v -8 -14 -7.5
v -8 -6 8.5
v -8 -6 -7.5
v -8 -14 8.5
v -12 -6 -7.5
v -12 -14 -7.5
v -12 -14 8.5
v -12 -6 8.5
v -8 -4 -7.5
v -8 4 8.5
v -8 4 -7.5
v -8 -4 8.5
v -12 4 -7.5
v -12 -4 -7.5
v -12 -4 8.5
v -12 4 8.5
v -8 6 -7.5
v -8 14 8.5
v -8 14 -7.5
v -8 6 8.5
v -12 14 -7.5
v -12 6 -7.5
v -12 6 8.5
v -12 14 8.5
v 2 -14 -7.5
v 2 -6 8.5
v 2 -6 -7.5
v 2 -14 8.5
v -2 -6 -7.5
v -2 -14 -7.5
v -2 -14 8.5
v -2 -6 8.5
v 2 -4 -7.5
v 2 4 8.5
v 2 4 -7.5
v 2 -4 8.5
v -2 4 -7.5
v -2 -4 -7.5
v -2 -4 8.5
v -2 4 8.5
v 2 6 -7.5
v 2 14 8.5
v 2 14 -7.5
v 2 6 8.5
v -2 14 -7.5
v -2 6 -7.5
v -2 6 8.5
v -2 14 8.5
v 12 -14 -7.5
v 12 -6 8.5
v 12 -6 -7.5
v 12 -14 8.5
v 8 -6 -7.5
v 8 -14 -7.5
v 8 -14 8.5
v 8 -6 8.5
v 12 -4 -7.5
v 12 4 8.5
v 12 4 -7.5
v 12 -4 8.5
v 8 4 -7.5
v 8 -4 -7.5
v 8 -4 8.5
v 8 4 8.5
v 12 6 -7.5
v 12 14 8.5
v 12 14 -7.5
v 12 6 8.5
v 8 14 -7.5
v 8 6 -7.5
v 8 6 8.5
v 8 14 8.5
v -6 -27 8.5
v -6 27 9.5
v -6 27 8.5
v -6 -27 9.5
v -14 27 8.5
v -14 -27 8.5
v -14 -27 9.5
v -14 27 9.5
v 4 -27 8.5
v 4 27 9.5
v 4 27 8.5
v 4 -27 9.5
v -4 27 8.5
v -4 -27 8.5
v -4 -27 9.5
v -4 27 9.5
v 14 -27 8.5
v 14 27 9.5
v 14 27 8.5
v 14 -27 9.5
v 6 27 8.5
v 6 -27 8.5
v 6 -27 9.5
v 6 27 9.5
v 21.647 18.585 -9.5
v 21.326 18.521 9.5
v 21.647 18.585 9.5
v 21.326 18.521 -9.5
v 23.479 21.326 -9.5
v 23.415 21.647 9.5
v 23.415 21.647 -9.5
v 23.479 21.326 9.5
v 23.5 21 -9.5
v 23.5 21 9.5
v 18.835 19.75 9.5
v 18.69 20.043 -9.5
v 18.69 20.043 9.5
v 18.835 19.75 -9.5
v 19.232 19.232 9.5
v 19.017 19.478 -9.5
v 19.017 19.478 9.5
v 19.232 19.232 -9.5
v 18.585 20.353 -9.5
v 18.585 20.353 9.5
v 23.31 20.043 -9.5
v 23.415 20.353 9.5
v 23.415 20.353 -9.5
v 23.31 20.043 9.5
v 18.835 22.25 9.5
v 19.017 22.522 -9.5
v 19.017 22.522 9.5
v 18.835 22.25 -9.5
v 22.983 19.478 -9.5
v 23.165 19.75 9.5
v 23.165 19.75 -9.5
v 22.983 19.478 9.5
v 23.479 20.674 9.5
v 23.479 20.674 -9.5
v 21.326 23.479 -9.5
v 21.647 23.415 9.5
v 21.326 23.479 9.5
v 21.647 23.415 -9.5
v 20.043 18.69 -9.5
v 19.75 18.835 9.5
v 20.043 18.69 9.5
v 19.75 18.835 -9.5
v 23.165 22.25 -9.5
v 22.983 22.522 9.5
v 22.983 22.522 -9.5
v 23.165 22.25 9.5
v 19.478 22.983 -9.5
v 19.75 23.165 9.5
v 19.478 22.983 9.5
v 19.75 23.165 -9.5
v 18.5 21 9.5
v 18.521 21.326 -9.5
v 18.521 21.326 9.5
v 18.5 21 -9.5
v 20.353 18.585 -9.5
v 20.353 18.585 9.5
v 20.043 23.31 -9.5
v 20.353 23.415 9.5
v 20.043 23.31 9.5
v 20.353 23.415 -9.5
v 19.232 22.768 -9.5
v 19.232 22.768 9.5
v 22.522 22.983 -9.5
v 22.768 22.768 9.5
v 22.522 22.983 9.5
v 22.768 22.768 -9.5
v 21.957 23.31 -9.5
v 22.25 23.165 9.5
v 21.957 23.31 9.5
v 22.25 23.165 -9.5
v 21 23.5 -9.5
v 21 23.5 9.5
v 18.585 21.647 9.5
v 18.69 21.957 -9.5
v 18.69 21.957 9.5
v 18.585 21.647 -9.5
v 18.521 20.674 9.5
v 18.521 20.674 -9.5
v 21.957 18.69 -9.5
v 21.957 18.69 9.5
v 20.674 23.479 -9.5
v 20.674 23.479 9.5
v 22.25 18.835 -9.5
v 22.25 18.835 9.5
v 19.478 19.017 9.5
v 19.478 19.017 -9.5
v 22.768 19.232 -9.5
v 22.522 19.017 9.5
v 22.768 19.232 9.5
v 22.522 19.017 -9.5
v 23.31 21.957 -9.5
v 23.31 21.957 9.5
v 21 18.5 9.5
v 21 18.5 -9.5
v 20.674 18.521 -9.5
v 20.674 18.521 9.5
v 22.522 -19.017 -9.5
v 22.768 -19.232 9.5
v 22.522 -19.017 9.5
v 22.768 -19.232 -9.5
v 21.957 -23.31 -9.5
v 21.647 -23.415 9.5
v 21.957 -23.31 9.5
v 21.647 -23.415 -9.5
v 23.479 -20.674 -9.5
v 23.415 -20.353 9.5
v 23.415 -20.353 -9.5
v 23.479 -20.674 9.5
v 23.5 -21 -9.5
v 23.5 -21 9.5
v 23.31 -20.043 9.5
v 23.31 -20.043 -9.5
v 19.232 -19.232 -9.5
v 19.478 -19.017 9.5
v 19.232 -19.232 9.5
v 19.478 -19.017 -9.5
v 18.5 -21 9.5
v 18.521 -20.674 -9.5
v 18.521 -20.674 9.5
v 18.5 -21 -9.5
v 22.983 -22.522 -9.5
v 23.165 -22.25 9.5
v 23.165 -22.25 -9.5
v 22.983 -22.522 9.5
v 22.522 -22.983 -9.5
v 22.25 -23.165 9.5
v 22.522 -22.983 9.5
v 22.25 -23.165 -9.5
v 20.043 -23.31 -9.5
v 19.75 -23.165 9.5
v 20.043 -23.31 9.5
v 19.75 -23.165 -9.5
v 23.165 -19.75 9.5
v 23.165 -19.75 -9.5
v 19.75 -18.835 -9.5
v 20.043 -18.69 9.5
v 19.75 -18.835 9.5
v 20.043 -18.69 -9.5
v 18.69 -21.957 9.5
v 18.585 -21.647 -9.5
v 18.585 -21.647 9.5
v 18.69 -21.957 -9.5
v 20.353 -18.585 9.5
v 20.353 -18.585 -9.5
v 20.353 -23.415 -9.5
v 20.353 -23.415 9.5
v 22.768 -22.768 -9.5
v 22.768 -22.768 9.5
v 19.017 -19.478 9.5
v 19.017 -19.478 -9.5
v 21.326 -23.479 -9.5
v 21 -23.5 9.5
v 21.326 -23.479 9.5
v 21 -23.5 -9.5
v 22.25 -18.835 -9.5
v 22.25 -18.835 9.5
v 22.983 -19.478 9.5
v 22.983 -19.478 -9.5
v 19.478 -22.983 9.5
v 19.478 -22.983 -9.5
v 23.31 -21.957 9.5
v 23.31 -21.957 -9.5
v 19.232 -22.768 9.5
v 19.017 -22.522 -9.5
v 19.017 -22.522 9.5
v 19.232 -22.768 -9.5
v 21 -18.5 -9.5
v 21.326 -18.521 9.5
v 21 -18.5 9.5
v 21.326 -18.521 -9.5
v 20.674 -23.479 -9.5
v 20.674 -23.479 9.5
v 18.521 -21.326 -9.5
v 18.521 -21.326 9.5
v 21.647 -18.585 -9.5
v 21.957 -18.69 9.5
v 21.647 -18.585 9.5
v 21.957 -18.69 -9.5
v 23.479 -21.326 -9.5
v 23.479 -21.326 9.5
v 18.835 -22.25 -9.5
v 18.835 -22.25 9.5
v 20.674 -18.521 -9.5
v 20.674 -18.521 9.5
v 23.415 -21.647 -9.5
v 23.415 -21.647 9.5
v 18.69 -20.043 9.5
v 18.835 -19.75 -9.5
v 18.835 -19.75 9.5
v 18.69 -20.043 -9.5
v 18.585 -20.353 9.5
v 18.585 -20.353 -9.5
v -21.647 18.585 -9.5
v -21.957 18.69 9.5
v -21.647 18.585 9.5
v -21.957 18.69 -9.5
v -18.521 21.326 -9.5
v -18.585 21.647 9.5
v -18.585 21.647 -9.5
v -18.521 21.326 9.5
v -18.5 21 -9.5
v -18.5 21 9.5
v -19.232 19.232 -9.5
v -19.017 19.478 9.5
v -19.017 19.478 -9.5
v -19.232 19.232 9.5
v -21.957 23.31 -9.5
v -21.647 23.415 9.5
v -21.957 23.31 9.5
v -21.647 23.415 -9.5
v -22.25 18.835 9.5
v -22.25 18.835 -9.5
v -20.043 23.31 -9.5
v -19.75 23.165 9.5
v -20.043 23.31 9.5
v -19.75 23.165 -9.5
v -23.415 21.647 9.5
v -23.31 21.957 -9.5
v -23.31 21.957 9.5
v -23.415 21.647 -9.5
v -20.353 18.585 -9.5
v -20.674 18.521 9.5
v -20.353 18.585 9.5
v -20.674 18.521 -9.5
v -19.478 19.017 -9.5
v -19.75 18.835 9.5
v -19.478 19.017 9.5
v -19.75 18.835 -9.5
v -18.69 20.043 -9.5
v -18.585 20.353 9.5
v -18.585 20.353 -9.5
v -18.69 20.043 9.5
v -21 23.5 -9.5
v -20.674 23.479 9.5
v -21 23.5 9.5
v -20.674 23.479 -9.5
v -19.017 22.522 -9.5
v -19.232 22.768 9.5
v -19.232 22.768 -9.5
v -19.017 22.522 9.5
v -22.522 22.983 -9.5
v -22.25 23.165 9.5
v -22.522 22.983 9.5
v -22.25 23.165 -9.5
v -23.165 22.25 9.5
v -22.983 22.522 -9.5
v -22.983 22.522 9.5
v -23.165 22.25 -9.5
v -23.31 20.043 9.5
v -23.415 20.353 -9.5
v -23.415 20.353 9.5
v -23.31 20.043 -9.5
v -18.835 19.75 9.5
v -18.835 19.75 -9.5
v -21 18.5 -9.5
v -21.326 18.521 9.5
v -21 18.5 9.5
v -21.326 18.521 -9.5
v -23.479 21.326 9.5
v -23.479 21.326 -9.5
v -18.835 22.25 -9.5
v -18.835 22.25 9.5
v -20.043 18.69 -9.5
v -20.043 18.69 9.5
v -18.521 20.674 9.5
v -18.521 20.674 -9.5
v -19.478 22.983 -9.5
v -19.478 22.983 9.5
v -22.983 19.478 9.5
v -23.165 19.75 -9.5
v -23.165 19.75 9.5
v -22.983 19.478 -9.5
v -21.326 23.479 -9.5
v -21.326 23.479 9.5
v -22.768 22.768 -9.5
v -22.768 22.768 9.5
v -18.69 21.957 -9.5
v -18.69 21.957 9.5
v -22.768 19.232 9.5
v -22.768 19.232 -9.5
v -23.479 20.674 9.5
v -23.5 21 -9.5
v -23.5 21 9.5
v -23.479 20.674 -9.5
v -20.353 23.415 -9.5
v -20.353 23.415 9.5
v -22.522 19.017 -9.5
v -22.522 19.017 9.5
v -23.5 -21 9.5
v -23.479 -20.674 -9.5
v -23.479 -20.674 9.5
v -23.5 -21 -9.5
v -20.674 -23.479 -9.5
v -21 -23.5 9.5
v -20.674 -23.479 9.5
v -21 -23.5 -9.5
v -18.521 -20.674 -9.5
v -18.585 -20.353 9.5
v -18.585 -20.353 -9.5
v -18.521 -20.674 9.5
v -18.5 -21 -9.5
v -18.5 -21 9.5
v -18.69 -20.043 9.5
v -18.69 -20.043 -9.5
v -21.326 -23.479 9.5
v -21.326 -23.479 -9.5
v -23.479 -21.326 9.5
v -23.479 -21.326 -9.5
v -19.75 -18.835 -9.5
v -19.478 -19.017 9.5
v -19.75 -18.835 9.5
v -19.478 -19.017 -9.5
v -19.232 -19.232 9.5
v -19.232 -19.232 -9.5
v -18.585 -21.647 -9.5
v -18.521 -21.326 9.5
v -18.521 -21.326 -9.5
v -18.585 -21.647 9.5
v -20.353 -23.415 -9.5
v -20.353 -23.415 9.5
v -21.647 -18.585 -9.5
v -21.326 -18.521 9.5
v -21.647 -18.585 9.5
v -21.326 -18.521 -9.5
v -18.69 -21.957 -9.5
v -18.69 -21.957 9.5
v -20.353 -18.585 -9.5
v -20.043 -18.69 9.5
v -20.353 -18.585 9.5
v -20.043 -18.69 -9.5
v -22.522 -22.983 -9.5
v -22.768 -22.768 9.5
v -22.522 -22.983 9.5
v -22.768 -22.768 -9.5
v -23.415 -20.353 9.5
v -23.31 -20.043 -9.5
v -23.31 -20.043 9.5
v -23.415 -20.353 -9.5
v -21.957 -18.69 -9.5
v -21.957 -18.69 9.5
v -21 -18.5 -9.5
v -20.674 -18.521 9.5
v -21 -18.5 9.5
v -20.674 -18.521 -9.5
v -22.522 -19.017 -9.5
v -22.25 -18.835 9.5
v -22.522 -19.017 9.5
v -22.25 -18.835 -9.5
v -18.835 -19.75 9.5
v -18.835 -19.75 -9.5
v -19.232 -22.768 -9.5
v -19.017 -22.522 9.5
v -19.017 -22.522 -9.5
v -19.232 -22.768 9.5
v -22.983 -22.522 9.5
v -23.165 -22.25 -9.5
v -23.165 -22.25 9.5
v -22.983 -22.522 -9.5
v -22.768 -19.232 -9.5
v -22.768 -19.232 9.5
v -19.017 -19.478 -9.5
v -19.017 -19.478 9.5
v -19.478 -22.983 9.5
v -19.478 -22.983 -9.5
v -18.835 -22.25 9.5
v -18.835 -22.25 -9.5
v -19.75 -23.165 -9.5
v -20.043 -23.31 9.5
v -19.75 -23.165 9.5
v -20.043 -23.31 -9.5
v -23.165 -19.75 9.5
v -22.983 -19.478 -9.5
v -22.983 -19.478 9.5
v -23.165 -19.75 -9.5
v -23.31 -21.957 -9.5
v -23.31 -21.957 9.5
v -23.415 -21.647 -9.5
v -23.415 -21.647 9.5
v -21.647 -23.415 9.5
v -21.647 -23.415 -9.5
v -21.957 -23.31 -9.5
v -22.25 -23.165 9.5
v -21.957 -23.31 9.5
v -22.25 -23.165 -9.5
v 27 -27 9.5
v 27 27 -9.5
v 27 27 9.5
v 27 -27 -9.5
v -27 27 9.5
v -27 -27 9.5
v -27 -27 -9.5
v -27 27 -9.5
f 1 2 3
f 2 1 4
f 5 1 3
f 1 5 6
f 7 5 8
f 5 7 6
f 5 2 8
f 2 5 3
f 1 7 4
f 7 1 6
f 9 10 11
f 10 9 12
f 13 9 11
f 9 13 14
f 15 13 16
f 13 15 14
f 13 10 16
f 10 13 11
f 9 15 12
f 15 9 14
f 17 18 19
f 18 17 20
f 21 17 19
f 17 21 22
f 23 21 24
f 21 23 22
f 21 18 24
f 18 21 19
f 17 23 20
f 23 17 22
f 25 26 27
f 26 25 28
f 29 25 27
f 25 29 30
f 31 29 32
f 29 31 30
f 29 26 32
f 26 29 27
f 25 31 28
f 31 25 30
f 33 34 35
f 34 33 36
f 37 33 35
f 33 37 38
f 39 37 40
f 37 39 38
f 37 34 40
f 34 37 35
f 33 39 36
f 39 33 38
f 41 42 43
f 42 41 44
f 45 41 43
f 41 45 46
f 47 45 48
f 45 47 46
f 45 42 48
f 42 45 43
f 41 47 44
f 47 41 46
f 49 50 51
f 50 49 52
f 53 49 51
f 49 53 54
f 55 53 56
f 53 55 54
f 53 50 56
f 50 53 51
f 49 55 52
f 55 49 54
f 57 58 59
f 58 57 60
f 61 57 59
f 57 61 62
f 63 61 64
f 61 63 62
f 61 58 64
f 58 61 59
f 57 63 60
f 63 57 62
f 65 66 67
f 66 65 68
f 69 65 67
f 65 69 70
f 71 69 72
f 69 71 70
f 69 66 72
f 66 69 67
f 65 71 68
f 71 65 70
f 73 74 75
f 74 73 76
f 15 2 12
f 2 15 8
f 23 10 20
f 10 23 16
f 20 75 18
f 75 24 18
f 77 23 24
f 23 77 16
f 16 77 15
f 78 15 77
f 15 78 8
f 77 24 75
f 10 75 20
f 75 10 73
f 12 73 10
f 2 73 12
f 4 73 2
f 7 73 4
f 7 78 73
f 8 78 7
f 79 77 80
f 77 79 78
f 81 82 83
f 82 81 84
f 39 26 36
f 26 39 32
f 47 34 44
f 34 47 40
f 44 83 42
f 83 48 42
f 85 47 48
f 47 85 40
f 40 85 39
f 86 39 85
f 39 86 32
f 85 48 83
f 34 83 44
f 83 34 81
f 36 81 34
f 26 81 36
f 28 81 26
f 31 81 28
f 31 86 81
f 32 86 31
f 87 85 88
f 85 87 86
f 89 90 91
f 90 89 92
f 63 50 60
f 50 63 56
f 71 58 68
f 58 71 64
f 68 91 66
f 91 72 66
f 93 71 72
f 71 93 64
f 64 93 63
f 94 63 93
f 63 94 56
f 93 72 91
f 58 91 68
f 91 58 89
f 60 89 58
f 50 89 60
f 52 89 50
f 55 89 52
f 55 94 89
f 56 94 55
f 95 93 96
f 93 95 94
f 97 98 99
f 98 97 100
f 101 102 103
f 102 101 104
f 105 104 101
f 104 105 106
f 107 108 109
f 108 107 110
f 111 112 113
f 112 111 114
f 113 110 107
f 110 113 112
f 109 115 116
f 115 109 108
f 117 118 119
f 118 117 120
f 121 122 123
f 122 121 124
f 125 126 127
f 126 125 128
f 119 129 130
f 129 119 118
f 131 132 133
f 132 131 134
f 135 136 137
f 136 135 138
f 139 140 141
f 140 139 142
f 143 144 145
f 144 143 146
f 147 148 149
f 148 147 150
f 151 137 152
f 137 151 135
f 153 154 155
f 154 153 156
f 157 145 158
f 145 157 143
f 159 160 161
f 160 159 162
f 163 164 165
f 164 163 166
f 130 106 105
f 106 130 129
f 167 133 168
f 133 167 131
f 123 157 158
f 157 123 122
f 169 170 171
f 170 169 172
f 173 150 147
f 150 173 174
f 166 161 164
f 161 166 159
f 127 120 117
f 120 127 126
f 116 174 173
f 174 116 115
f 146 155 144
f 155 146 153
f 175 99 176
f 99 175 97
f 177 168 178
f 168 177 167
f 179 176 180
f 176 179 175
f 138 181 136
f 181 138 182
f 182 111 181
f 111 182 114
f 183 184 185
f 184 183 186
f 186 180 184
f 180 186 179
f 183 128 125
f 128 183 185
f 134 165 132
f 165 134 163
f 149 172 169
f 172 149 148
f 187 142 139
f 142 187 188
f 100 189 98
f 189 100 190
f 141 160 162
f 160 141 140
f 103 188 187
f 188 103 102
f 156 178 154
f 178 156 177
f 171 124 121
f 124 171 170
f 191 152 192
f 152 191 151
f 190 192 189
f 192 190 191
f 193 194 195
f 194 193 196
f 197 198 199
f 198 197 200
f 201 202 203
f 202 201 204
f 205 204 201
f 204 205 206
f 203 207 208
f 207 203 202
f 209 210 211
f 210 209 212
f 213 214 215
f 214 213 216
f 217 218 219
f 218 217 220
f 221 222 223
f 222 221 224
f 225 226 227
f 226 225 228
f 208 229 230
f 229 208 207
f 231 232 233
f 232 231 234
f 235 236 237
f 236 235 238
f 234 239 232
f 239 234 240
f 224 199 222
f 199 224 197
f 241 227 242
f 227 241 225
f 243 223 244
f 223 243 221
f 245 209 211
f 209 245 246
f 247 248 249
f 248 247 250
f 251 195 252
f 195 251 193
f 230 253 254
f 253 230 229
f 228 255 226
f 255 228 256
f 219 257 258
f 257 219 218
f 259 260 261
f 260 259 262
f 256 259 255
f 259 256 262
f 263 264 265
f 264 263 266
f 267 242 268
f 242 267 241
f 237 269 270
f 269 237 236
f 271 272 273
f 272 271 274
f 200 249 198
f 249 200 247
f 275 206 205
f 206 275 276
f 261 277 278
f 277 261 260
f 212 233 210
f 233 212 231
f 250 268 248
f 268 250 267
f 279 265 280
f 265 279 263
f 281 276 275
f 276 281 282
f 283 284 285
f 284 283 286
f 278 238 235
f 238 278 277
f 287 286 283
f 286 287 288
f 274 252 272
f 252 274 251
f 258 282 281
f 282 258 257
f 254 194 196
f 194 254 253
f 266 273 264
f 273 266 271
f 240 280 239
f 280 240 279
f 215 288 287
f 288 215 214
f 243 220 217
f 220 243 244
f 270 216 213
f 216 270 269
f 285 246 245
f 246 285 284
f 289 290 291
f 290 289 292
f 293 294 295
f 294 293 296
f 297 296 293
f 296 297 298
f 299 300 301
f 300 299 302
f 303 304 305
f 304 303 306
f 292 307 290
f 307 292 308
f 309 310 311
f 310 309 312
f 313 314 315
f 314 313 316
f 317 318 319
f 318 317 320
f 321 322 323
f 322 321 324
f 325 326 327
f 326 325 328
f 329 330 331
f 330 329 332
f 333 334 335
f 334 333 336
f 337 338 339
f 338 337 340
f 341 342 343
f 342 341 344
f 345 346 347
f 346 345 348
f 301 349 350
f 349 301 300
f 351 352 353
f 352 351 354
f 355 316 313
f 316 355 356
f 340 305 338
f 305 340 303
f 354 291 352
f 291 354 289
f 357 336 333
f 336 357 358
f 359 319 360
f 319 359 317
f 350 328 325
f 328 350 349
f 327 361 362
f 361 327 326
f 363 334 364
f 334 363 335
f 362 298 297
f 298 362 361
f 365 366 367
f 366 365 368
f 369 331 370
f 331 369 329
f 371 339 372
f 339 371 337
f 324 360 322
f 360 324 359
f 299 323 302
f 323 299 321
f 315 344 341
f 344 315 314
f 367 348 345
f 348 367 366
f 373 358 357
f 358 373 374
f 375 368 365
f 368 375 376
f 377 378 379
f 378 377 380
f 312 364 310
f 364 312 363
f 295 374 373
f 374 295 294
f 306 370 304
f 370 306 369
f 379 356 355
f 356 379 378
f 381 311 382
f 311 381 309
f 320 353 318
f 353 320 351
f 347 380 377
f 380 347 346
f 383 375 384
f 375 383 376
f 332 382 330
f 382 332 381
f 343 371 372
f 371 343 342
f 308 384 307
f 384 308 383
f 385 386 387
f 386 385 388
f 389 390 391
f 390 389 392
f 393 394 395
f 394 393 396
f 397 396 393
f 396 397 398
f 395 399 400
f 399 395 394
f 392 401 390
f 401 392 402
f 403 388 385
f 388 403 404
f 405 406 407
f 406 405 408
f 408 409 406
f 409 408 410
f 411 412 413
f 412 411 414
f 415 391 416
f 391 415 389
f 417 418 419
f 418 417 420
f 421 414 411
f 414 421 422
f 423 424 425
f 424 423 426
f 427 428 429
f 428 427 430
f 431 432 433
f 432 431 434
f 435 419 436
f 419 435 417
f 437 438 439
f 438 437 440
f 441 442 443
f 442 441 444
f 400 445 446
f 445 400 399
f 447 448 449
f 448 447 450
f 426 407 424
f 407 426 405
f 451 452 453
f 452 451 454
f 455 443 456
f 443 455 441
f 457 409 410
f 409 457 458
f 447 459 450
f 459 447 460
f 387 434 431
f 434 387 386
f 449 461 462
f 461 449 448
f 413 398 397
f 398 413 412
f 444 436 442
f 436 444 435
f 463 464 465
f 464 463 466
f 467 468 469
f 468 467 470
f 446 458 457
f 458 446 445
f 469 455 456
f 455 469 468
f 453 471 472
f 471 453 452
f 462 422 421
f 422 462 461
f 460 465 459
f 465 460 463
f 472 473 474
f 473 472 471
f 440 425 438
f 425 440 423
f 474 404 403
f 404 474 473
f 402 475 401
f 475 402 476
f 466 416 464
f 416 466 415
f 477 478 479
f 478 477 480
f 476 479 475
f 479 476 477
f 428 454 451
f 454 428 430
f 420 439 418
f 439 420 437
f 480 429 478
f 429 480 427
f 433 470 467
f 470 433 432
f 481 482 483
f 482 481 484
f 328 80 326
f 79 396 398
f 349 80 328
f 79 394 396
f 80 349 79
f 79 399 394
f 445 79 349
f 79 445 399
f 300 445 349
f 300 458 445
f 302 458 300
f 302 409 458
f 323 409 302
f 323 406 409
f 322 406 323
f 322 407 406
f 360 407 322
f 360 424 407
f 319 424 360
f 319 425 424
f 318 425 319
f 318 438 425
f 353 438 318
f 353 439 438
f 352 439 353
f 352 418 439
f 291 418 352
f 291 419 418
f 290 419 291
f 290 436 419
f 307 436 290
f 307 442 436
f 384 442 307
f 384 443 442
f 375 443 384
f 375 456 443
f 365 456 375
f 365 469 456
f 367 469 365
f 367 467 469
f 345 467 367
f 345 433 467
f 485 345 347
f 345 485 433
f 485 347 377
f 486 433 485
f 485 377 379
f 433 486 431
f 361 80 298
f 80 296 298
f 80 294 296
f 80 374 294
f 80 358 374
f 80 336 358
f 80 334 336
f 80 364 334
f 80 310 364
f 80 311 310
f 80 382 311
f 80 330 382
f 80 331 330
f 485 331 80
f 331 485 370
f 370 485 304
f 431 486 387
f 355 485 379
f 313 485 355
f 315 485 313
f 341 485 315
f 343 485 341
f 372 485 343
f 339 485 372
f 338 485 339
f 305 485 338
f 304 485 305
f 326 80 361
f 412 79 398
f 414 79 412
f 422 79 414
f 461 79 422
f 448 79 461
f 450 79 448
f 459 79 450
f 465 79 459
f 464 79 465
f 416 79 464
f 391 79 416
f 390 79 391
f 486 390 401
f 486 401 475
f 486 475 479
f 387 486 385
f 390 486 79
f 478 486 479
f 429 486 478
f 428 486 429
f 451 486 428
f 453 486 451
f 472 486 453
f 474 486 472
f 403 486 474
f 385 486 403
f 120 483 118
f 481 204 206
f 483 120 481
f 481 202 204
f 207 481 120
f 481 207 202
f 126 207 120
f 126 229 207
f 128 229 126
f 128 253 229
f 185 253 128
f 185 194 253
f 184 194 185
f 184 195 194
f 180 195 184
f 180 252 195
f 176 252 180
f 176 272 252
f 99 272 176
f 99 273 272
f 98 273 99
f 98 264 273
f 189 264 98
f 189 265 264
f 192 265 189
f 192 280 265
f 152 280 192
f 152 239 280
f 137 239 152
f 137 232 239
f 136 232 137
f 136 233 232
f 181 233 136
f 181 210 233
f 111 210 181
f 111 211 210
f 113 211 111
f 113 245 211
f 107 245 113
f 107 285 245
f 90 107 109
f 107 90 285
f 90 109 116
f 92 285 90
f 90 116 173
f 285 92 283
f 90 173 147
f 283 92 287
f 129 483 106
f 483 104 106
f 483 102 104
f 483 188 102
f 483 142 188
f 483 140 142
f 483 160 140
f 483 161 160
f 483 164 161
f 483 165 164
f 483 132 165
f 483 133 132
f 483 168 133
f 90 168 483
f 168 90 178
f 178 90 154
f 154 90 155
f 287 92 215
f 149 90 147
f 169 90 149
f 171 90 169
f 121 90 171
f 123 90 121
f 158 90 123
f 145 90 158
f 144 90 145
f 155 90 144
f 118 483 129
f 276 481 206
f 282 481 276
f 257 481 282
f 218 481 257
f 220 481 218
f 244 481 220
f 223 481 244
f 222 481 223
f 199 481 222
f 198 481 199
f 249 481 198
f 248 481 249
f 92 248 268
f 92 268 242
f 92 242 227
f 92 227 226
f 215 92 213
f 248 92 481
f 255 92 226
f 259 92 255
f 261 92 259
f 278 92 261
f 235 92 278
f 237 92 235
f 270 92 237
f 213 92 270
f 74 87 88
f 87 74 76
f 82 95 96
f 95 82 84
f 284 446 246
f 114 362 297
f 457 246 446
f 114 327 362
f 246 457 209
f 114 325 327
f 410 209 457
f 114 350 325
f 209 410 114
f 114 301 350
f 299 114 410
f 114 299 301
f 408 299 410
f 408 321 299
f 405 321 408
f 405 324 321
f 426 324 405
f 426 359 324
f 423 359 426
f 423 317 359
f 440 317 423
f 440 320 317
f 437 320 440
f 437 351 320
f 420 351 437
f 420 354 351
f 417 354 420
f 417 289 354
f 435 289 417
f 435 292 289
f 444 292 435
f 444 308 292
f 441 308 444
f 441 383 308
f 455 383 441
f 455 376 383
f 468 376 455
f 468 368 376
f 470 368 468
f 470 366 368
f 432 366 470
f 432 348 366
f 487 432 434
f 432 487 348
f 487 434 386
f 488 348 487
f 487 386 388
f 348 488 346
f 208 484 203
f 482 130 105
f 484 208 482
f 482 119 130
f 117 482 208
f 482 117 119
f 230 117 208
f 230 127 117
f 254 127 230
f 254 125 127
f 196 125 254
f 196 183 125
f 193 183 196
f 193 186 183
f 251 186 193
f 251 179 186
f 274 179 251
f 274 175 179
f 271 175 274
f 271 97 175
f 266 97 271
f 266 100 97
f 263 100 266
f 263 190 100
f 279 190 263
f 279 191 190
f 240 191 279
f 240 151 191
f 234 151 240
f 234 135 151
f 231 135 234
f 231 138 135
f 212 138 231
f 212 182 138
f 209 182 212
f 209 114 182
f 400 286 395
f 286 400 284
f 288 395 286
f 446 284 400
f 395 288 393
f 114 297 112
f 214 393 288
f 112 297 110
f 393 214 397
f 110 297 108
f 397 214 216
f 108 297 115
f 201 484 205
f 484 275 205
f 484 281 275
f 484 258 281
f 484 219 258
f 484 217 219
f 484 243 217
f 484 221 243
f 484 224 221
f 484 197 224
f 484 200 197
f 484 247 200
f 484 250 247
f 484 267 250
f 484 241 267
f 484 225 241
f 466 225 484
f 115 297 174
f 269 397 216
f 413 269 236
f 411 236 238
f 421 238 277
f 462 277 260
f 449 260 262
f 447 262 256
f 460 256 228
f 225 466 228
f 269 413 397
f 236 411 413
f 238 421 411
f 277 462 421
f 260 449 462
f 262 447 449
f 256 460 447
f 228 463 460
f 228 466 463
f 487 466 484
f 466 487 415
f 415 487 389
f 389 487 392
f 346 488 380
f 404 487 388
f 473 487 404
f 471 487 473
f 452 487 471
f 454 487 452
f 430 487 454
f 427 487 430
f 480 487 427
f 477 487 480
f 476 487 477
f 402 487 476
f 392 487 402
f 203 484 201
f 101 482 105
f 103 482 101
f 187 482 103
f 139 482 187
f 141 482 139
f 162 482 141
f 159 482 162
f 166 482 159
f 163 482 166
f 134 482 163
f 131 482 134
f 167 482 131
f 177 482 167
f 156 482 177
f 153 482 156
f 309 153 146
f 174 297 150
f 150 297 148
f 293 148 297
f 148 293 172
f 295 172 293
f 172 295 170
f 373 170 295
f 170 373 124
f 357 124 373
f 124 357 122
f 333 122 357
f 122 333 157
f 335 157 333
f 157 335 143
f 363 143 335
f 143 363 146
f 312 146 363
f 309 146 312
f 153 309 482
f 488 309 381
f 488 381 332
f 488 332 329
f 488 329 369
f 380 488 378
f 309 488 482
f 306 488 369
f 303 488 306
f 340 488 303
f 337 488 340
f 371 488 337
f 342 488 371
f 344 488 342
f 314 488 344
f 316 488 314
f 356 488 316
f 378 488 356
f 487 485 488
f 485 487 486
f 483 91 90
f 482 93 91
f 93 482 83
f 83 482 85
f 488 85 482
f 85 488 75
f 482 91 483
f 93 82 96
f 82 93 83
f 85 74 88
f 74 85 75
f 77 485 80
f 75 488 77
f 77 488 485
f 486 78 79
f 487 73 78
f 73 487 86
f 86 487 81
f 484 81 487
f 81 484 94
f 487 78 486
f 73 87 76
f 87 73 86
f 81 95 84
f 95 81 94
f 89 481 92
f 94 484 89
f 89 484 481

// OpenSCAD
$fn = 48;

union() {
	difference() {
		cube(center = true, size = [54, 54, 19]);
		translate(v = [-10.0000000000, -10.0000000000, 2]) {
			union() {
				translate(v = [0, 0, 0]) {
					translate(v = [0, 0, 0]) {
						cube(center = true, size = [4, 8, 19]);
					}
				}
				translate(v = [0, 10, 0]) {
					translate(v = [0, 0, 0]) {
						cube(center = true, size = [4, 8, 19]);
					}
				}
				translate(v = [0, 20, 0]) {
					translate(v = [0, 0, 0]) {
						cube(center = true, size = [4, 8, 19]);
					}
				}
				translate(v = [0, 0, 0]) {
					translate(v = [10, 0, 0]) {
						cube(center = true, size = [4, 8, 19]);
					}
				}
				translate(v = [0, 10, 0]) {
					translate(v = [10, 0, 0]) {
						cube(center = true, size = [4, 8, 19]);
					}
				}
				translate(v = [0, 20, 0]) {
					translate(v = [10, 0, 0]) {
						cube(center = true, size = [4, 8, 19]);
					}
				}
				translate(v = [0, 0, 0]) {
					translate(v = [20, 0, 0]) {
						cube(center = true, size = [4, 8, 19]);
					}
				}
				translate(v = [0, 10, 0]) {
					translate(v = [20, 0, 0]) {
						cube(center = true, size = [4, 8, 19]);
					}
				}
				translate(v = [0, 20, 0]) {
					translate(v = [20, 0, 0]) {
						cube(center = true, size = [4, 8, 19]);
					}
				}
			}
		}
		translate(v = [-10.0000000000, 0, 9.5000000000]) {
			union() {
				translate(v = [0, 0, 0]) {
					cube(center = true, size = [8, 108, 2]);
				}
				translate(v = [10, 0, 0]) {
					cube(center = true, size = [8, 108, 2]);
				}
				translate(v = [20, 0, 0]) {
					cube(center = true, size = [8, 108, 2]);
				}
			}
		}
		union() {
			translate(v = [21.0000000000, 21.0000000000, 0]) {
				cylinder(center = true, d = 5, h = 38);
			}
			translate(v = [21.0000000000, -21.0000000000, 0]) {
				cylinder(center = true, d = 5, h = 38);
			}
			translate(v = [-21.0000000000, 21.0000000000, 0]) {
				cylinder(center = true, d = 5, h = 38);
			}
			translate(v = [-21.0000000000, -21.0000000000, 0]) {
				cylinder(center = true, d = 5, h = 38);
			}
		}
	}
}
/***********************************************
*********      SolidPython code:      **********
************************************************
 
#! /usr/bin/env python
# -*- coding: utf-8 -*-
from __future__ import division
import os
import sys

# Assumes SolidPython is in site-packages or elsewhwere in sys.path
from solid import *
from solid.utils import *

SEGMENTS = 48

def bottomHoles(pins, cell, z, z_offset):
    bottom_holes = union()
    # center at end of process
    # pin is (x,y,z) = (3,7,15)
    bottom_hole = cube([4,8,z], center=True)
    for x in range(pins):
        for y in range(pins):
            bottom_holes = bottom_holes + forward(y*cell)(right(x*cell)(bottom_hole))
    bottom_holes = translate([-(pins-1)*cell/2, -(pins-1)*cell/2, z_offset] )(bottom_holes)
    return bottom_holes

def slideHoles(pins, cell, boarder, z, z_slide):
    # x_pin +2 boarder + gap 1 + 2 boarder; 
    x_slide = 3 + 2 + 1 + 2
    slide_hole = cube([x_slide, ((pins*cell)+boarder) *2, z_slide*2], center=True)
    slide_holes = union()
    for x in range(pins):
        slide_holes = slide_holes + right(x*cell)(slide_hole)
    slide_holes = translate([-(pins-1)*cell/2, 0, z/2])(slide_holes)
    return slide_holes

def screwHoles(pins, cell, boarder, z):
    screw_holes = union()
    screw_d = 5
    screwHole = cylinder(d=screw_d, h=z*2, center=True)
    inset_from_edge = 6
    half_side = ((pins*cell)+boarder)/2-inset_from_edge
    screw_holes = screw_holes + translate([half_side,half_side,0])(
                                          screwHole)
    screw_holes = screw_holes + translate([half_side,-half_side,0])(
                                          screwHole)
    screw_holes = screw_holes + translate([-half_side,half_side,0])(
                                          screwHole)
    screw_holes = screw_holes + translate([-half_side,-half_side,0])(
                                          screwHole)
    return screw_holes
    

def bottom(pins=2):
    boarder = 24
    cell = 10
    # base of 2, z_pin + 1 clearance + 1 z_slide
    z = 15 + 2  + 1 + 1 
    bottom = cube([(pins*cell)+boarder, (pins*cell)+boarder,z], 
                    center=True)
    bottom -= bottomHoles(pins,cell,z, z_offset = 2)
    bottom -= slideHoles(pins,cell, boarder, z, z_slide=1)
    bottom -= screwHoles(pins,cell, boarder, z)
    return bottom


def assembly():
    # Your code here!
    a = union()
    a = a + bottom(pins=3)

    return a

if __name__ == '__main__':
    a = assembly()
    scad_render_to_file(a, file_header='$fn = %s;' % SEGMENTS, include_orig_code=True)
 
 
************************************************/
